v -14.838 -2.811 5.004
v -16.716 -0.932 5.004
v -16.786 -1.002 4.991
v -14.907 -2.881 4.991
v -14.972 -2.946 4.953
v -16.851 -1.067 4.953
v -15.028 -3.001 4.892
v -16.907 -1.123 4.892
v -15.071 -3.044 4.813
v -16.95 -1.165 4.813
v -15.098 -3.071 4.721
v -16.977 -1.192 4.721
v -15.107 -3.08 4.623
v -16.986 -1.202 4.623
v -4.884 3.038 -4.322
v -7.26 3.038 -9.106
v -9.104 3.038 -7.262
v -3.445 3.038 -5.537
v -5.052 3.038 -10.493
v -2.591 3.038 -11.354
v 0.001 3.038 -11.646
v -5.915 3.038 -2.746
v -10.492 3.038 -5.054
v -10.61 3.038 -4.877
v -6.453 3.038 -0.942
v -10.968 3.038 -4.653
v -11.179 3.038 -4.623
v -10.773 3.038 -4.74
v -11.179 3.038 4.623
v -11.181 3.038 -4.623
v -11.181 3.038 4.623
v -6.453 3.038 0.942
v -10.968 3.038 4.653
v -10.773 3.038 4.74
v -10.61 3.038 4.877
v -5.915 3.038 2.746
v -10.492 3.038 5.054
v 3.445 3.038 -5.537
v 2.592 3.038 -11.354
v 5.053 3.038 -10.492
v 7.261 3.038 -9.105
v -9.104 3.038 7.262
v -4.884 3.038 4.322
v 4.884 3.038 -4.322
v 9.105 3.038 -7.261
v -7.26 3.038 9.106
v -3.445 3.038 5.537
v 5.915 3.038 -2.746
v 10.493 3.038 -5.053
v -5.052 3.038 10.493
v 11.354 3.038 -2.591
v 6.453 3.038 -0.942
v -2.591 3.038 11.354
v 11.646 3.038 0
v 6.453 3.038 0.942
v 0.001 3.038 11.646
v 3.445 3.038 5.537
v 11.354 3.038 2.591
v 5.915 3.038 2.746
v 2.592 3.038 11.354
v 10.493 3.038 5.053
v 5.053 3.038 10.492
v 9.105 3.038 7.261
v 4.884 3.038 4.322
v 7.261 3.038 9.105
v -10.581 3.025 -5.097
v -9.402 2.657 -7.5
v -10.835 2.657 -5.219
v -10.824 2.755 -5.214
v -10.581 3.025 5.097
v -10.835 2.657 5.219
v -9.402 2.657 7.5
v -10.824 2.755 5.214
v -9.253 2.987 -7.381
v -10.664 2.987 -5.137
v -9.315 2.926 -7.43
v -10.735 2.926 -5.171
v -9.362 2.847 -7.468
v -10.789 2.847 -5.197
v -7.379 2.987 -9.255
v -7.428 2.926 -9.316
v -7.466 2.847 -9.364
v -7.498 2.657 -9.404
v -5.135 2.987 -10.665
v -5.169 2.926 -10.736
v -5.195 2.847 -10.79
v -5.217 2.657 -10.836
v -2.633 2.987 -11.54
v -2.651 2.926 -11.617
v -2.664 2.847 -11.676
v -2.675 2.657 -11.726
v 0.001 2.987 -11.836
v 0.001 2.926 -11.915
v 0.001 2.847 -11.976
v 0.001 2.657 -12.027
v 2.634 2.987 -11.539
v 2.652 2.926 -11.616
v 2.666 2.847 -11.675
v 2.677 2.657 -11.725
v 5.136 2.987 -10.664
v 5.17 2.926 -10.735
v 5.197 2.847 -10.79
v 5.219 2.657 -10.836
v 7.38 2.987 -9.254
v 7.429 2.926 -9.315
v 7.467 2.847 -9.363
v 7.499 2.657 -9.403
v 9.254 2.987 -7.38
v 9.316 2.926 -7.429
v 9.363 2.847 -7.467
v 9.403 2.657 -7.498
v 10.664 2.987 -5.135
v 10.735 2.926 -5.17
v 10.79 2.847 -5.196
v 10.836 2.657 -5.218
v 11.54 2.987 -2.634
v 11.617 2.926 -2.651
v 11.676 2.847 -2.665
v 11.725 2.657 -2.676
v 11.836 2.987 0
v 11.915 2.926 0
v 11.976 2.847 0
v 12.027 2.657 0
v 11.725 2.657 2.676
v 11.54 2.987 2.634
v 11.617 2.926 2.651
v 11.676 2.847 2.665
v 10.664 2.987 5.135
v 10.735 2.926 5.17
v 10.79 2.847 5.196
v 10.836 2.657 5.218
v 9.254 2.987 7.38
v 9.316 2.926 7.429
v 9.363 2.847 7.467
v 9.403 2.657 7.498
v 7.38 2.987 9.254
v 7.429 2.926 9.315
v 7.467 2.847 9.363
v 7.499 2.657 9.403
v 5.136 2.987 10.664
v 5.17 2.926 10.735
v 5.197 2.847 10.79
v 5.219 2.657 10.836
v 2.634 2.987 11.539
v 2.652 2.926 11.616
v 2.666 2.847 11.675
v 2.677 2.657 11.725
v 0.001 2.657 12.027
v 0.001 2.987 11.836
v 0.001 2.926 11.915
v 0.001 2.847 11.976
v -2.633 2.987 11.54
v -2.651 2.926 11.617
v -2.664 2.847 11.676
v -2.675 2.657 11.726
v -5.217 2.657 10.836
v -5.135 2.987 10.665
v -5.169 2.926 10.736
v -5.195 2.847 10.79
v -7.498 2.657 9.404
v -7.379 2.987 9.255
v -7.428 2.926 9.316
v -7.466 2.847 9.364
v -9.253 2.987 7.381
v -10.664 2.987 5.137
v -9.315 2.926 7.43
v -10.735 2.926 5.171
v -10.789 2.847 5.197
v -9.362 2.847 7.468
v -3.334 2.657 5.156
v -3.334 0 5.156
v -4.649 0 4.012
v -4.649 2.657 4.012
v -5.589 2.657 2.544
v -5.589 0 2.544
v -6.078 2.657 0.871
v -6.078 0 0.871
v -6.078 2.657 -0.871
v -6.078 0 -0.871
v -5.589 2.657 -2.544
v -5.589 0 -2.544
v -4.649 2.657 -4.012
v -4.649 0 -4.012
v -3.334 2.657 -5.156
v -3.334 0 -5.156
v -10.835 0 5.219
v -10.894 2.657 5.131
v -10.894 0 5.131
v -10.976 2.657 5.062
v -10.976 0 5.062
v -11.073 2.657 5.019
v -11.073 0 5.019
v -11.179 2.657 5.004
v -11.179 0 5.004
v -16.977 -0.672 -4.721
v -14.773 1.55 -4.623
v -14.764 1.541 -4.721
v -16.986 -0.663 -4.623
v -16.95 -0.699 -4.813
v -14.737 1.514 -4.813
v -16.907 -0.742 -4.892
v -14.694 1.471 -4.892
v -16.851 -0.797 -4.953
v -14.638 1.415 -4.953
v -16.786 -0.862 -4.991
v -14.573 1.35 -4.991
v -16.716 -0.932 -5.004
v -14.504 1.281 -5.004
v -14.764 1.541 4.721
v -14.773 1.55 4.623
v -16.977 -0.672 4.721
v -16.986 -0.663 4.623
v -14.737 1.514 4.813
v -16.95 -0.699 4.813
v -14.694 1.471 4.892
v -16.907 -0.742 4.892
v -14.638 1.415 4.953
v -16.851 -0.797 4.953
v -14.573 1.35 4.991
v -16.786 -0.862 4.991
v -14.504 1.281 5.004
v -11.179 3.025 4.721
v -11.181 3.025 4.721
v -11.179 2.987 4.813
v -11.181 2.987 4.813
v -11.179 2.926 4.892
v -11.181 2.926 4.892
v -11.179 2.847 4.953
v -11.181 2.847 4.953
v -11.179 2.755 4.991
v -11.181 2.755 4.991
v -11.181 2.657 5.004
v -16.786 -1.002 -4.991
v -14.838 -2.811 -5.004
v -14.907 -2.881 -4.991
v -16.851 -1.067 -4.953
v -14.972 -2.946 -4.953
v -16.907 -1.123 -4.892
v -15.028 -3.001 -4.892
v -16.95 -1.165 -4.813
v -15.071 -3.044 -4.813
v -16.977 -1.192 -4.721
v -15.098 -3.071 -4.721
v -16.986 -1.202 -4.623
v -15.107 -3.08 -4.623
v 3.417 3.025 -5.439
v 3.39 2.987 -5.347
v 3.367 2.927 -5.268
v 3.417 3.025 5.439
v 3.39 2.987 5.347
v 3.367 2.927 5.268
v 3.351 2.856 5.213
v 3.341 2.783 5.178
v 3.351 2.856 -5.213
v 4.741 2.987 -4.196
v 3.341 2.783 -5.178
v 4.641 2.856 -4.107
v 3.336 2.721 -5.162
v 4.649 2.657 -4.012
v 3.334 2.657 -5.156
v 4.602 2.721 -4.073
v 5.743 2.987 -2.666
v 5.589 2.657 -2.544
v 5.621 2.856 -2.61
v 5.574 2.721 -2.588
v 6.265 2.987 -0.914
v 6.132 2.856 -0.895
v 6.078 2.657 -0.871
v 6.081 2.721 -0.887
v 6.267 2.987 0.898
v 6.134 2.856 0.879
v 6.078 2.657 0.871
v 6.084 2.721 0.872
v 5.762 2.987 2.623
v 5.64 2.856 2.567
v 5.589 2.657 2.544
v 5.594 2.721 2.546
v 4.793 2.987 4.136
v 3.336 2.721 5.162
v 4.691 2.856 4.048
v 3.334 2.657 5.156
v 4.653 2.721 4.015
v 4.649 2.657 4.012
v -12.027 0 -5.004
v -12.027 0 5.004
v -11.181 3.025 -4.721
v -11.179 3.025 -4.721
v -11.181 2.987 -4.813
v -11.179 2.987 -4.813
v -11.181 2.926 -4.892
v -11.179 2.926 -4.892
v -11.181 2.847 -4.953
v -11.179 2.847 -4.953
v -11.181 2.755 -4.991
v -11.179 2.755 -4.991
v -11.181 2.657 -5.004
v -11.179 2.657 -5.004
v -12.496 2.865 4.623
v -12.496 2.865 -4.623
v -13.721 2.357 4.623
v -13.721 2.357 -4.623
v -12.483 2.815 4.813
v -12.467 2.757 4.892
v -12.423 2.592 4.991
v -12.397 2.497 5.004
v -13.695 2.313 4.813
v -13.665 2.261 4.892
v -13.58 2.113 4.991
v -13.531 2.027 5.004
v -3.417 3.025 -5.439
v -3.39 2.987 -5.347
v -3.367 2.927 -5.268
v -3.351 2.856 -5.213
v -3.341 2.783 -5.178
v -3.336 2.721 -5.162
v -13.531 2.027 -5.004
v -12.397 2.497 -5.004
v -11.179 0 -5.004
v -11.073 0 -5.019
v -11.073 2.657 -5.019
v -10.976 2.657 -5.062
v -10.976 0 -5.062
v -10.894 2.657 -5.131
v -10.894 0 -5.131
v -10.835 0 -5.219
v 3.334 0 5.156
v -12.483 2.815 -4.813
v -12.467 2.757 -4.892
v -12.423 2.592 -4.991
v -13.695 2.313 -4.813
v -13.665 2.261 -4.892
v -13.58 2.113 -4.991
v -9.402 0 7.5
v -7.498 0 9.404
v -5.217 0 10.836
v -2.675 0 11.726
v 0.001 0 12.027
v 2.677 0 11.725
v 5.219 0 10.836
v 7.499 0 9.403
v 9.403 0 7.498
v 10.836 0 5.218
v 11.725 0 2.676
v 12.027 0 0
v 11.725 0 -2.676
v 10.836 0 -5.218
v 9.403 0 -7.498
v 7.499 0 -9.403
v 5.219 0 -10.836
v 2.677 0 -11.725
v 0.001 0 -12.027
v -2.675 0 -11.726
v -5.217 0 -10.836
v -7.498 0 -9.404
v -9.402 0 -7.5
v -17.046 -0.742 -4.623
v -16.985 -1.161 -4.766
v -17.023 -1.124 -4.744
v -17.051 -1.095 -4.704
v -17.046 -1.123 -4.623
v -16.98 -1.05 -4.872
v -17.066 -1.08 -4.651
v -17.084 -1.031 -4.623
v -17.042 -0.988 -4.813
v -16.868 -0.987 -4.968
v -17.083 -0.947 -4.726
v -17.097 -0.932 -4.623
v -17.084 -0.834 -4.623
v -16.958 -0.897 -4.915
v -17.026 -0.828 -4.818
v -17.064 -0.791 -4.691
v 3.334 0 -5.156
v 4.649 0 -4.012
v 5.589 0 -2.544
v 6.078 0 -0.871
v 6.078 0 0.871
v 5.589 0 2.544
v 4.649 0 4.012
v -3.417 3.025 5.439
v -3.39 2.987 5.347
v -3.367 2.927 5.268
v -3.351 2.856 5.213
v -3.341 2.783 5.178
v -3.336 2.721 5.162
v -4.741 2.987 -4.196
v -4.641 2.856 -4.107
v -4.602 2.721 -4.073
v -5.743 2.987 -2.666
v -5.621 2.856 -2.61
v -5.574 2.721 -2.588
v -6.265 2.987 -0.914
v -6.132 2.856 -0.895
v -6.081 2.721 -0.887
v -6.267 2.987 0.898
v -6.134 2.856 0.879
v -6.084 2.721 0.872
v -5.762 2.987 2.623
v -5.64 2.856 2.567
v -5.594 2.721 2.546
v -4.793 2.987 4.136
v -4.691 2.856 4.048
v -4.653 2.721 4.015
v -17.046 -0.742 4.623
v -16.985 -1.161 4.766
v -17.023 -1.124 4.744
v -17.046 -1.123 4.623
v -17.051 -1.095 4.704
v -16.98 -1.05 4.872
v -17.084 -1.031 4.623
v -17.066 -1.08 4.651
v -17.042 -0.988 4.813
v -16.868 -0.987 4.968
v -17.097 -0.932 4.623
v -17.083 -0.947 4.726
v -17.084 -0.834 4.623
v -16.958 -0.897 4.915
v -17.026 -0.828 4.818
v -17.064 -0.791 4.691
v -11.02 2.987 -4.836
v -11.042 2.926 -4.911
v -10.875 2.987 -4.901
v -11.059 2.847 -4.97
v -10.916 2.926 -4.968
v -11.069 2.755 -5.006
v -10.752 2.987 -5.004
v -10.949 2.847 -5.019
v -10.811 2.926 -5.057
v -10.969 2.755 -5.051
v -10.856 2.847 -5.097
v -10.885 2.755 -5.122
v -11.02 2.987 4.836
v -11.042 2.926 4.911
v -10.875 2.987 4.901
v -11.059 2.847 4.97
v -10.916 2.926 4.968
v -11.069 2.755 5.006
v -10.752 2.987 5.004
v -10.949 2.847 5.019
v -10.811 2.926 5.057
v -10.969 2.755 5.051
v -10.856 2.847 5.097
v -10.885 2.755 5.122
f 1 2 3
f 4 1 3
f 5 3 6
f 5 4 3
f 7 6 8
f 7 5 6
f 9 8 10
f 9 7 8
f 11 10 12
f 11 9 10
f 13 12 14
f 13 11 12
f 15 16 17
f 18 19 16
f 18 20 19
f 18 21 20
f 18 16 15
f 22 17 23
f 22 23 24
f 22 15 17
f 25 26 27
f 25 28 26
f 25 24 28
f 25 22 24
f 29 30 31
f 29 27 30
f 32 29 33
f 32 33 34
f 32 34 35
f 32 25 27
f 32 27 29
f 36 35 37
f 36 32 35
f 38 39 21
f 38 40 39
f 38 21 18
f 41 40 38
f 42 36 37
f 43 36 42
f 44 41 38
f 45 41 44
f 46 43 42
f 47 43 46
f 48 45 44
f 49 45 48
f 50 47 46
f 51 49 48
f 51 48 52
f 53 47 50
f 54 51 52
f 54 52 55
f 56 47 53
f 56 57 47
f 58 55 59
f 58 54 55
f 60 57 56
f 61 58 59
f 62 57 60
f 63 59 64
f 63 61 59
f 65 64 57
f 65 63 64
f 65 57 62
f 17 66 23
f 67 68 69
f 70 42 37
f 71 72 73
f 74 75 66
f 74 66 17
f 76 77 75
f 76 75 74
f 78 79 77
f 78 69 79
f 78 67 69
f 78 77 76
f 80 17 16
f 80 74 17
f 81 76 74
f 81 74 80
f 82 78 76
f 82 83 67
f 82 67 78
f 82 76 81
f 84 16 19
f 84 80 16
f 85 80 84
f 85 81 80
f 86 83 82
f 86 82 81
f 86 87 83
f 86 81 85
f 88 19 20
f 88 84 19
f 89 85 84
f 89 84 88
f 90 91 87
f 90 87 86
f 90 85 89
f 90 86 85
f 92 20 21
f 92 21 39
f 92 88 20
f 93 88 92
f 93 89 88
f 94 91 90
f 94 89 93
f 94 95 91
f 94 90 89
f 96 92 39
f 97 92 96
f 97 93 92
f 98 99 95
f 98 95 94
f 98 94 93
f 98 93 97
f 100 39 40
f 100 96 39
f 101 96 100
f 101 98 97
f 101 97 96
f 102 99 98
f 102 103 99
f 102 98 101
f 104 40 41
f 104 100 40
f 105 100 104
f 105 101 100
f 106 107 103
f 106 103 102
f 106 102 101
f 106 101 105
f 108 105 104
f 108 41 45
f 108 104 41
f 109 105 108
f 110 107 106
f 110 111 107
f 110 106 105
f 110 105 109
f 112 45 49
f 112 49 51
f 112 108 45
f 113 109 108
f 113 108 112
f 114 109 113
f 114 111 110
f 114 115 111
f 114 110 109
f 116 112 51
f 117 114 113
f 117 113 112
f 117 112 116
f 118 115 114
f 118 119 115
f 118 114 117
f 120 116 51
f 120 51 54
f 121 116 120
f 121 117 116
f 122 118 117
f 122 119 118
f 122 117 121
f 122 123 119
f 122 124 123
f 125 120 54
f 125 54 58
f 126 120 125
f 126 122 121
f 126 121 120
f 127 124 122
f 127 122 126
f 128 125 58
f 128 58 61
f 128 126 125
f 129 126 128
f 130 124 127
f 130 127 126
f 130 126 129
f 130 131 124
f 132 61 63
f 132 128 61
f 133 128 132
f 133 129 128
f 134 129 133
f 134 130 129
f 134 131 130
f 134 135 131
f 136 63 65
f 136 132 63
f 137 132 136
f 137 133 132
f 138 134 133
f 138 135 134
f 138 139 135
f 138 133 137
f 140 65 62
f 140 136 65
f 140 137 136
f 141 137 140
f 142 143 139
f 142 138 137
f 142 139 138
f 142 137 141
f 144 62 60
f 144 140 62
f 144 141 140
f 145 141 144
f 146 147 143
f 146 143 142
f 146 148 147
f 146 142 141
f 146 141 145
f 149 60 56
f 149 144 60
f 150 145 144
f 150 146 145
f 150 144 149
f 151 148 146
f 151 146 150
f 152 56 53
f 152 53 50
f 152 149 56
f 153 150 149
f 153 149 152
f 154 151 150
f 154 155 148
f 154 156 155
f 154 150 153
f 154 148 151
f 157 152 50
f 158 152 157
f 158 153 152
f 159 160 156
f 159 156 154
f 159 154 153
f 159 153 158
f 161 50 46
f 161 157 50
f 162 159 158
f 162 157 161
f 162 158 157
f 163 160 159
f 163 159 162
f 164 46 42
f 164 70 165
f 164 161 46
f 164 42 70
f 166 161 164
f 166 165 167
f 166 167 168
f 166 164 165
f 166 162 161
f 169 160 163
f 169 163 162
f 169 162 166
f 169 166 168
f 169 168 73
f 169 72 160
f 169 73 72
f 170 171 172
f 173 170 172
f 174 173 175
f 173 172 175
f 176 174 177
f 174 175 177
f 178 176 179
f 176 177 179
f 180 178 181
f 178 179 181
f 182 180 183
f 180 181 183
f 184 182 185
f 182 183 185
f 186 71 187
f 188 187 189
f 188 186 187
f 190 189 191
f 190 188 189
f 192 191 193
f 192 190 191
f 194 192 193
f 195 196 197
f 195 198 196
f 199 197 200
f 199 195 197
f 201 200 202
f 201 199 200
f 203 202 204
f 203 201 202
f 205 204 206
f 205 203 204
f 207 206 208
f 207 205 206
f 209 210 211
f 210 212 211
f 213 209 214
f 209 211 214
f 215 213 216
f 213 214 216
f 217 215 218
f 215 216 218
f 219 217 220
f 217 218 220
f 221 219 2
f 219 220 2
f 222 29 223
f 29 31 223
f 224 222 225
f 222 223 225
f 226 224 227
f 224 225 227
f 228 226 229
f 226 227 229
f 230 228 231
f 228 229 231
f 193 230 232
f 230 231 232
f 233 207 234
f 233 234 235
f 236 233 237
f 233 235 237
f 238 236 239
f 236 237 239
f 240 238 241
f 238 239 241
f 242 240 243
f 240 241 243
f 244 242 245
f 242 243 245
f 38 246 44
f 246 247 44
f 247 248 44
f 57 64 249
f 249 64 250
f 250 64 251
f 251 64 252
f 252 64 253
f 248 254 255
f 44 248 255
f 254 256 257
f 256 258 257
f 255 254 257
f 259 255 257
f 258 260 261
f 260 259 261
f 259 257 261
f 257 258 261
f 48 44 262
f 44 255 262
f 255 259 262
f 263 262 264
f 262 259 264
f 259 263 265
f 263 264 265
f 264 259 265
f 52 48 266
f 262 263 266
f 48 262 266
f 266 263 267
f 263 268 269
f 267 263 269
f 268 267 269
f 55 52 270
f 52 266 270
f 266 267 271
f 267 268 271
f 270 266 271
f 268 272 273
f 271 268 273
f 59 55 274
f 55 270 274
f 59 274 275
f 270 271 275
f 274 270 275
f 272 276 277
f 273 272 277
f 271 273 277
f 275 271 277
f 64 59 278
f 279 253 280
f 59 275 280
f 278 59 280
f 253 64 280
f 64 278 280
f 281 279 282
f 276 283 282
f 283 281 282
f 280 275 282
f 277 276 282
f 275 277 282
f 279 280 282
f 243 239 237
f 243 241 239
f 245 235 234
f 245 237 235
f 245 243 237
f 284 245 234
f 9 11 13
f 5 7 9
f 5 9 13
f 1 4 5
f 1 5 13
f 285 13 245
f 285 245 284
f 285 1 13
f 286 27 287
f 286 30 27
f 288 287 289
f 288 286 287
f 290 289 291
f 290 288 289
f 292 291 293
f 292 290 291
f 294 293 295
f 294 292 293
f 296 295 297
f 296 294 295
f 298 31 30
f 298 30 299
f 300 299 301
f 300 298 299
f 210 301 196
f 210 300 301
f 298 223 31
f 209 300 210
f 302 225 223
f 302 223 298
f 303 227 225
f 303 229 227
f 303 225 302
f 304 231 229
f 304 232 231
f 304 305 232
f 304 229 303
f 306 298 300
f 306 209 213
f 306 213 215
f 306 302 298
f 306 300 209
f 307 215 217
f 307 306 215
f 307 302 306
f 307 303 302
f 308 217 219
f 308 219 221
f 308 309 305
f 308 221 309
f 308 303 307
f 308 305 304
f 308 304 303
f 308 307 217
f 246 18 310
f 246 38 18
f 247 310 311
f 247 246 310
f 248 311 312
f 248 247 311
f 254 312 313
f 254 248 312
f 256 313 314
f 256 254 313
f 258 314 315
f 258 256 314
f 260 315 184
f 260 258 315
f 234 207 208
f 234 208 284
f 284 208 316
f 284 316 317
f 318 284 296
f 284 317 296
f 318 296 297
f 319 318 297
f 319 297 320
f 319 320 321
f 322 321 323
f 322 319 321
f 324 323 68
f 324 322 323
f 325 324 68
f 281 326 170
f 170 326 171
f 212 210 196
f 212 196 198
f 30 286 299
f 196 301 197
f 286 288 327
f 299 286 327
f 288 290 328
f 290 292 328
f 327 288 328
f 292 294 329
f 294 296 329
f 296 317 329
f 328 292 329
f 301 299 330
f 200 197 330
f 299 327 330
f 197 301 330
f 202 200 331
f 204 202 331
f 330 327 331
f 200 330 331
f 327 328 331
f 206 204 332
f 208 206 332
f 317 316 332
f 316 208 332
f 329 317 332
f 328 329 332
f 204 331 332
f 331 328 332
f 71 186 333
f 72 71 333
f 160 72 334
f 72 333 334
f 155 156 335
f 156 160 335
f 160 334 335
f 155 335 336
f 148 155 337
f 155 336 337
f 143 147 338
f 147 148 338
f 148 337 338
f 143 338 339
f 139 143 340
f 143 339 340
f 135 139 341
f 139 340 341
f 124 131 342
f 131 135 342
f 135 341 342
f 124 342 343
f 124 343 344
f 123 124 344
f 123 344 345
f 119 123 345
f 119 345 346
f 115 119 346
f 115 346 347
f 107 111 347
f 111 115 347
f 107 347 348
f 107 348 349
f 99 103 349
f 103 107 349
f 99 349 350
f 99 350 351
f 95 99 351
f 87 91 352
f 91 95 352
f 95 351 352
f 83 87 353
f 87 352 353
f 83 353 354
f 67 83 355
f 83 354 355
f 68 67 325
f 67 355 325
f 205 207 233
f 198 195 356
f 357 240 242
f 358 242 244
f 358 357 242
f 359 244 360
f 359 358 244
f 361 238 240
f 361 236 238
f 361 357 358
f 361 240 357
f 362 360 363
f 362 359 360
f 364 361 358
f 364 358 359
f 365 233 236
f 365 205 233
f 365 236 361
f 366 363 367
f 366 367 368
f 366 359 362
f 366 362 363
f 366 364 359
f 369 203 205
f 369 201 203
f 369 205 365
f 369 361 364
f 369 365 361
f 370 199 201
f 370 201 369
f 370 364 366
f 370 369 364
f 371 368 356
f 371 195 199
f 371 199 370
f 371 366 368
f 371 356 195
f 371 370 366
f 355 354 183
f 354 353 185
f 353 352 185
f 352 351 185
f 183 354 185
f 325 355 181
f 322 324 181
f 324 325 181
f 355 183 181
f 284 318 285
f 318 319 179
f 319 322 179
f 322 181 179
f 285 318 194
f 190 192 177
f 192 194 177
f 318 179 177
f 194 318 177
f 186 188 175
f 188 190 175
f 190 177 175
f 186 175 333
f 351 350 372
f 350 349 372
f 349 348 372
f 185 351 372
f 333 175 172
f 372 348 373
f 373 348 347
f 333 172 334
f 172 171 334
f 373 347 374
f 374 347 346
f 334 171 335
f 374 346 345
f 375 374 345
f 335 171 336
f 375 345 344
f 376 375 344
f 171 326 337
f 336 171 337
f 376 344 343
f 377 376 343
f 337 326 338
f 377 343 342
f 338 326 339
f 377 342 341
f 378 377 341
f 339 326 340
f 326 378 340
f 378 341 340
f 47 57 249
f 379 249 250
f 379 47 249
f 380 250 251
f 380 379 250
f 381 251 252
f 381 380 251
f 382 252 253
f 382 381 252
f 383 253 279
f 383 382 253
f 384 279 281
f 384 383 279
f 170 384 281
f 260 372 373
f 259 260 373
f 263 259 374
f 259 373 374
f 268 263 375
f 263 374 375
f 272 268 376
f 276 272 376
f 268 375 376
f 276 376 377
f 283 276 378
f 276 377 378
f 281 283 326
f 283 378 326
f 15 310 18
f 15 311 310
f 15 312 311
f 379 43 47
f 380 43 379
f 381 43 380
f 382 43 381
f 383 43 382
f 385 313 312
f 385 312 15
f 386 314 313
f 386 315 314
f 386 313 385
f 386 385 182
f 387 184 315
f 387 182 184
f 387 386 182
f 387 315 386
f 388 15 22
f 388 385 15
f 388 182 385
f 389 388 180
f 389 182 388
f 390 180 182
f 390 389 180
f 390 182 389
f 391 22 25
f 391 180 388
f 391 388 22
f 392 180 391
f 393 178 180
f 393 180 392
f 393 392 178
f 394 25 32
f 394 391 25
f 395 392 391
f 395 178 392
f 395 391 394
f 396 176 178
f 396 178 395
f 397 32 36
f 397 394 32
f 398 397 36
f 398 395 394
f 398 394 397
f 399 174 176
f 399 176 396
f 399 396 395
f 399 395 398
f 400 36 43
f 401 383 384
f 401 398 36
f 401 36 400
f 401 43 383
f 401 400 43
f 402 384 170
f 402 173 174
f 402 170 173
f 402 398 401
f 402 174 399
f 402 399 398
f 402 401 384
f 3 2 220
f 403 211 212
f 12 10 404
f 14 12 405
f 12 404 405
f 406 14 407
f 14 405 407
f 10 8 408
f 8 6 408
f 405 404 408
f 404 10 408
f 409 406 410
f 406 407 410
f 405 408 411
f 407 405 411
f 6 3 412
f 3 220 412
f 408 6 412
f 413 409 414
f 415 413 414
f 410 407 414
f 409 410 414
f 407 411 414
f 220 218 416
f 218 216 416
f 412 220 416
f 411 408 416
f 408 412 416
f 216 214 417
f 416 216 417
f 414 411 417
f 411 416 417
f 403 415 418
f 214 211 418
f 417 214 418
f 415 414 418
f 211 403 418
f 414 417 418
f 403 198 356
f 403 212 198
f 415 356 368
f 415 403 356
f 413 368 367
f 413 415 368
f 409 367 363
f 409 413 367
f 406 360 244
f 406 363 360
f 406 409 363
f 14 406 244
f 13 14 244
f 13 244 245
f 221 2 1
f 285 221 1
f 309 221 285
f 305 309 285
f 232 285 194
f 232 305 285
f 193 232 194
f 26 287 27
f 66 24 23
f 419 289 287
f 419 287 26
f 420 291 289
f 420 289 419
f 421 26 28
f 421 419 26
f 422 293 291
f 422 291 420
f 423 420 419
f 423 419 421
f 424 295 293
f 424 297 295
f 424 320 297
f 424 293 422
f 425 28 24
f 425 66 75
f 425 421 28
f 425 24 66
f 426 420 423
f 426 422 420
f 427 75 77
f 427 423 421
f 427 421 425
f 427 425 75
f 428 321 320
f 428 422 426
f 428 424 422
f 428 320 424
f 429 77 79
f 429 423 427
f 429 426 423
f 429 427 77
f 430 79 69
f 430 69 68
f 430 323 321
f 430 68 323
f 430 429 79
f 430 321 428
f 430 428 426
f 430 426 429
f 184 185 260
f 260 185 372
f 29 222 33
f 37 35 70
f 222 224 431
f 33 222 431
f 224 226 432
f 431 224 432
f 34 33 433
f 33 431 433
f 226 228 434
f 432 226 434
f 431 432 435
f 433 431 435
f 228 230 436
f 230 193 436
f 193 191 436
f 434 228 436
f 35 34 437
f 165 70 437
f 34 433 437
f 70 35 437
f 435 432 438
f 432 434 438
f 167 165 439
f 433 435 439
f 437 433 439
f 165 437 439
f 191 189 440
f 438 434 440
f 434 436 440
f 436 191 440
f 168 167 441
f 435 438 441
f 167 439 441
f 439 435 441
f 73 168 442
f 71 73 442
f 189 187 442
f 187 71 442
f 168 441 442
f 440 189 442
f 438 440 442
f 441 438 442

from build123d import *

# Parameters (mm, degrees)
SKETCH1_R           = 12.0269
BOSS_EXTRUDE1_DEPTH = 3.03784
BOSS_EXTRUDE2_DEPTH = 5.0038
FILLET1_R           = 5.08
FILLET2_R           = 0.381


with BuildPart() as part:
    # Sketch1 → Boss-Extrude1 (new body)
    with BuildSketch(Plane(origin=(0, 0, 0), x_dir=(1, 0, 0), z_dir=(0, 1, 0))):
        with Locations(Location((0, 0, 0), (0, 0, 270))):
            Circle(SKETCH1_R)
        with BuildLine():
            Line((-3.334475635, 5.1562), (3.334475635, 5.1562))
            ThreePointArc((3.334475635, 5.1562), (6.14045, 0), (3.334475635, -5.1562))
            Line((3.334475635, -5.1562), (-3.334475635, -5.1562))
            ThreePointArc((-3.334475635, -5.1562), (-6.14045, 0), (-3.334475635, 5.1562))
        make_face(mode=Mode.SUBTRACT)
    extrude(amount=BOSS_EXTRUDE1_DEPTH)

    # Sketch3 → Boss-Extrude2 (add, symmetric)
    with BuildSketch(Plane.XY):
        Polygon((-6.14045, 3.03784), (-13.285214528, 3.03784), (-17.255205114, -0.932150585), (-15.10712785, -3.08022785), (-12.0269, 0), (-6.14045, 0), align=None)
    extrude(amount=BOSS_EXTRUDE2_DEPTH, both=True)

    # Fillet1
    fillet1_edges = [part.edges().sort_by_distance(p)[0] for p in [
        (-13.285214528, 3.03784, 0),
    ]]
    fillet(fillet1_edges, radius=FILLET1_R)

    # Fillet2
    fillet2_edges = [part.edges().sort_by_distance(p)[0] for p in [
        (6.14045, 3.03784, 0),
        (0, 3.03784, -5.1562),
        (12.0269, 3.03784, 0),
        (-10.936558379, 1.51892, -5.0038),
        (-10.936558379, 1.51892, 5.0038),
        (-11.058784005, 3.03784, 5.0038),
        (-16.181166482, -2.006189217, 5.0038),
        (-11.058784005, 3.03784, -5.0038),
        (-16.181166482, -2.006189217, -5.0038),
        (-17.255205114, -0.932150585, 0),
        (-16.014158597, 0.308895932, -5.0038),
        (-16.014158597, 0.308895932, 5.0038),
        (-13.125041468, 2.651148025, -5.0038),
        (-13.125041468, 2.651148025, 5.0038),
        (-6.14045, 3.03784, 0),
        (0, 3.03784, 5.1562),
    ]]
    fillet(fillet2_edges, radius=FILLET2_R)


solid = part.part
